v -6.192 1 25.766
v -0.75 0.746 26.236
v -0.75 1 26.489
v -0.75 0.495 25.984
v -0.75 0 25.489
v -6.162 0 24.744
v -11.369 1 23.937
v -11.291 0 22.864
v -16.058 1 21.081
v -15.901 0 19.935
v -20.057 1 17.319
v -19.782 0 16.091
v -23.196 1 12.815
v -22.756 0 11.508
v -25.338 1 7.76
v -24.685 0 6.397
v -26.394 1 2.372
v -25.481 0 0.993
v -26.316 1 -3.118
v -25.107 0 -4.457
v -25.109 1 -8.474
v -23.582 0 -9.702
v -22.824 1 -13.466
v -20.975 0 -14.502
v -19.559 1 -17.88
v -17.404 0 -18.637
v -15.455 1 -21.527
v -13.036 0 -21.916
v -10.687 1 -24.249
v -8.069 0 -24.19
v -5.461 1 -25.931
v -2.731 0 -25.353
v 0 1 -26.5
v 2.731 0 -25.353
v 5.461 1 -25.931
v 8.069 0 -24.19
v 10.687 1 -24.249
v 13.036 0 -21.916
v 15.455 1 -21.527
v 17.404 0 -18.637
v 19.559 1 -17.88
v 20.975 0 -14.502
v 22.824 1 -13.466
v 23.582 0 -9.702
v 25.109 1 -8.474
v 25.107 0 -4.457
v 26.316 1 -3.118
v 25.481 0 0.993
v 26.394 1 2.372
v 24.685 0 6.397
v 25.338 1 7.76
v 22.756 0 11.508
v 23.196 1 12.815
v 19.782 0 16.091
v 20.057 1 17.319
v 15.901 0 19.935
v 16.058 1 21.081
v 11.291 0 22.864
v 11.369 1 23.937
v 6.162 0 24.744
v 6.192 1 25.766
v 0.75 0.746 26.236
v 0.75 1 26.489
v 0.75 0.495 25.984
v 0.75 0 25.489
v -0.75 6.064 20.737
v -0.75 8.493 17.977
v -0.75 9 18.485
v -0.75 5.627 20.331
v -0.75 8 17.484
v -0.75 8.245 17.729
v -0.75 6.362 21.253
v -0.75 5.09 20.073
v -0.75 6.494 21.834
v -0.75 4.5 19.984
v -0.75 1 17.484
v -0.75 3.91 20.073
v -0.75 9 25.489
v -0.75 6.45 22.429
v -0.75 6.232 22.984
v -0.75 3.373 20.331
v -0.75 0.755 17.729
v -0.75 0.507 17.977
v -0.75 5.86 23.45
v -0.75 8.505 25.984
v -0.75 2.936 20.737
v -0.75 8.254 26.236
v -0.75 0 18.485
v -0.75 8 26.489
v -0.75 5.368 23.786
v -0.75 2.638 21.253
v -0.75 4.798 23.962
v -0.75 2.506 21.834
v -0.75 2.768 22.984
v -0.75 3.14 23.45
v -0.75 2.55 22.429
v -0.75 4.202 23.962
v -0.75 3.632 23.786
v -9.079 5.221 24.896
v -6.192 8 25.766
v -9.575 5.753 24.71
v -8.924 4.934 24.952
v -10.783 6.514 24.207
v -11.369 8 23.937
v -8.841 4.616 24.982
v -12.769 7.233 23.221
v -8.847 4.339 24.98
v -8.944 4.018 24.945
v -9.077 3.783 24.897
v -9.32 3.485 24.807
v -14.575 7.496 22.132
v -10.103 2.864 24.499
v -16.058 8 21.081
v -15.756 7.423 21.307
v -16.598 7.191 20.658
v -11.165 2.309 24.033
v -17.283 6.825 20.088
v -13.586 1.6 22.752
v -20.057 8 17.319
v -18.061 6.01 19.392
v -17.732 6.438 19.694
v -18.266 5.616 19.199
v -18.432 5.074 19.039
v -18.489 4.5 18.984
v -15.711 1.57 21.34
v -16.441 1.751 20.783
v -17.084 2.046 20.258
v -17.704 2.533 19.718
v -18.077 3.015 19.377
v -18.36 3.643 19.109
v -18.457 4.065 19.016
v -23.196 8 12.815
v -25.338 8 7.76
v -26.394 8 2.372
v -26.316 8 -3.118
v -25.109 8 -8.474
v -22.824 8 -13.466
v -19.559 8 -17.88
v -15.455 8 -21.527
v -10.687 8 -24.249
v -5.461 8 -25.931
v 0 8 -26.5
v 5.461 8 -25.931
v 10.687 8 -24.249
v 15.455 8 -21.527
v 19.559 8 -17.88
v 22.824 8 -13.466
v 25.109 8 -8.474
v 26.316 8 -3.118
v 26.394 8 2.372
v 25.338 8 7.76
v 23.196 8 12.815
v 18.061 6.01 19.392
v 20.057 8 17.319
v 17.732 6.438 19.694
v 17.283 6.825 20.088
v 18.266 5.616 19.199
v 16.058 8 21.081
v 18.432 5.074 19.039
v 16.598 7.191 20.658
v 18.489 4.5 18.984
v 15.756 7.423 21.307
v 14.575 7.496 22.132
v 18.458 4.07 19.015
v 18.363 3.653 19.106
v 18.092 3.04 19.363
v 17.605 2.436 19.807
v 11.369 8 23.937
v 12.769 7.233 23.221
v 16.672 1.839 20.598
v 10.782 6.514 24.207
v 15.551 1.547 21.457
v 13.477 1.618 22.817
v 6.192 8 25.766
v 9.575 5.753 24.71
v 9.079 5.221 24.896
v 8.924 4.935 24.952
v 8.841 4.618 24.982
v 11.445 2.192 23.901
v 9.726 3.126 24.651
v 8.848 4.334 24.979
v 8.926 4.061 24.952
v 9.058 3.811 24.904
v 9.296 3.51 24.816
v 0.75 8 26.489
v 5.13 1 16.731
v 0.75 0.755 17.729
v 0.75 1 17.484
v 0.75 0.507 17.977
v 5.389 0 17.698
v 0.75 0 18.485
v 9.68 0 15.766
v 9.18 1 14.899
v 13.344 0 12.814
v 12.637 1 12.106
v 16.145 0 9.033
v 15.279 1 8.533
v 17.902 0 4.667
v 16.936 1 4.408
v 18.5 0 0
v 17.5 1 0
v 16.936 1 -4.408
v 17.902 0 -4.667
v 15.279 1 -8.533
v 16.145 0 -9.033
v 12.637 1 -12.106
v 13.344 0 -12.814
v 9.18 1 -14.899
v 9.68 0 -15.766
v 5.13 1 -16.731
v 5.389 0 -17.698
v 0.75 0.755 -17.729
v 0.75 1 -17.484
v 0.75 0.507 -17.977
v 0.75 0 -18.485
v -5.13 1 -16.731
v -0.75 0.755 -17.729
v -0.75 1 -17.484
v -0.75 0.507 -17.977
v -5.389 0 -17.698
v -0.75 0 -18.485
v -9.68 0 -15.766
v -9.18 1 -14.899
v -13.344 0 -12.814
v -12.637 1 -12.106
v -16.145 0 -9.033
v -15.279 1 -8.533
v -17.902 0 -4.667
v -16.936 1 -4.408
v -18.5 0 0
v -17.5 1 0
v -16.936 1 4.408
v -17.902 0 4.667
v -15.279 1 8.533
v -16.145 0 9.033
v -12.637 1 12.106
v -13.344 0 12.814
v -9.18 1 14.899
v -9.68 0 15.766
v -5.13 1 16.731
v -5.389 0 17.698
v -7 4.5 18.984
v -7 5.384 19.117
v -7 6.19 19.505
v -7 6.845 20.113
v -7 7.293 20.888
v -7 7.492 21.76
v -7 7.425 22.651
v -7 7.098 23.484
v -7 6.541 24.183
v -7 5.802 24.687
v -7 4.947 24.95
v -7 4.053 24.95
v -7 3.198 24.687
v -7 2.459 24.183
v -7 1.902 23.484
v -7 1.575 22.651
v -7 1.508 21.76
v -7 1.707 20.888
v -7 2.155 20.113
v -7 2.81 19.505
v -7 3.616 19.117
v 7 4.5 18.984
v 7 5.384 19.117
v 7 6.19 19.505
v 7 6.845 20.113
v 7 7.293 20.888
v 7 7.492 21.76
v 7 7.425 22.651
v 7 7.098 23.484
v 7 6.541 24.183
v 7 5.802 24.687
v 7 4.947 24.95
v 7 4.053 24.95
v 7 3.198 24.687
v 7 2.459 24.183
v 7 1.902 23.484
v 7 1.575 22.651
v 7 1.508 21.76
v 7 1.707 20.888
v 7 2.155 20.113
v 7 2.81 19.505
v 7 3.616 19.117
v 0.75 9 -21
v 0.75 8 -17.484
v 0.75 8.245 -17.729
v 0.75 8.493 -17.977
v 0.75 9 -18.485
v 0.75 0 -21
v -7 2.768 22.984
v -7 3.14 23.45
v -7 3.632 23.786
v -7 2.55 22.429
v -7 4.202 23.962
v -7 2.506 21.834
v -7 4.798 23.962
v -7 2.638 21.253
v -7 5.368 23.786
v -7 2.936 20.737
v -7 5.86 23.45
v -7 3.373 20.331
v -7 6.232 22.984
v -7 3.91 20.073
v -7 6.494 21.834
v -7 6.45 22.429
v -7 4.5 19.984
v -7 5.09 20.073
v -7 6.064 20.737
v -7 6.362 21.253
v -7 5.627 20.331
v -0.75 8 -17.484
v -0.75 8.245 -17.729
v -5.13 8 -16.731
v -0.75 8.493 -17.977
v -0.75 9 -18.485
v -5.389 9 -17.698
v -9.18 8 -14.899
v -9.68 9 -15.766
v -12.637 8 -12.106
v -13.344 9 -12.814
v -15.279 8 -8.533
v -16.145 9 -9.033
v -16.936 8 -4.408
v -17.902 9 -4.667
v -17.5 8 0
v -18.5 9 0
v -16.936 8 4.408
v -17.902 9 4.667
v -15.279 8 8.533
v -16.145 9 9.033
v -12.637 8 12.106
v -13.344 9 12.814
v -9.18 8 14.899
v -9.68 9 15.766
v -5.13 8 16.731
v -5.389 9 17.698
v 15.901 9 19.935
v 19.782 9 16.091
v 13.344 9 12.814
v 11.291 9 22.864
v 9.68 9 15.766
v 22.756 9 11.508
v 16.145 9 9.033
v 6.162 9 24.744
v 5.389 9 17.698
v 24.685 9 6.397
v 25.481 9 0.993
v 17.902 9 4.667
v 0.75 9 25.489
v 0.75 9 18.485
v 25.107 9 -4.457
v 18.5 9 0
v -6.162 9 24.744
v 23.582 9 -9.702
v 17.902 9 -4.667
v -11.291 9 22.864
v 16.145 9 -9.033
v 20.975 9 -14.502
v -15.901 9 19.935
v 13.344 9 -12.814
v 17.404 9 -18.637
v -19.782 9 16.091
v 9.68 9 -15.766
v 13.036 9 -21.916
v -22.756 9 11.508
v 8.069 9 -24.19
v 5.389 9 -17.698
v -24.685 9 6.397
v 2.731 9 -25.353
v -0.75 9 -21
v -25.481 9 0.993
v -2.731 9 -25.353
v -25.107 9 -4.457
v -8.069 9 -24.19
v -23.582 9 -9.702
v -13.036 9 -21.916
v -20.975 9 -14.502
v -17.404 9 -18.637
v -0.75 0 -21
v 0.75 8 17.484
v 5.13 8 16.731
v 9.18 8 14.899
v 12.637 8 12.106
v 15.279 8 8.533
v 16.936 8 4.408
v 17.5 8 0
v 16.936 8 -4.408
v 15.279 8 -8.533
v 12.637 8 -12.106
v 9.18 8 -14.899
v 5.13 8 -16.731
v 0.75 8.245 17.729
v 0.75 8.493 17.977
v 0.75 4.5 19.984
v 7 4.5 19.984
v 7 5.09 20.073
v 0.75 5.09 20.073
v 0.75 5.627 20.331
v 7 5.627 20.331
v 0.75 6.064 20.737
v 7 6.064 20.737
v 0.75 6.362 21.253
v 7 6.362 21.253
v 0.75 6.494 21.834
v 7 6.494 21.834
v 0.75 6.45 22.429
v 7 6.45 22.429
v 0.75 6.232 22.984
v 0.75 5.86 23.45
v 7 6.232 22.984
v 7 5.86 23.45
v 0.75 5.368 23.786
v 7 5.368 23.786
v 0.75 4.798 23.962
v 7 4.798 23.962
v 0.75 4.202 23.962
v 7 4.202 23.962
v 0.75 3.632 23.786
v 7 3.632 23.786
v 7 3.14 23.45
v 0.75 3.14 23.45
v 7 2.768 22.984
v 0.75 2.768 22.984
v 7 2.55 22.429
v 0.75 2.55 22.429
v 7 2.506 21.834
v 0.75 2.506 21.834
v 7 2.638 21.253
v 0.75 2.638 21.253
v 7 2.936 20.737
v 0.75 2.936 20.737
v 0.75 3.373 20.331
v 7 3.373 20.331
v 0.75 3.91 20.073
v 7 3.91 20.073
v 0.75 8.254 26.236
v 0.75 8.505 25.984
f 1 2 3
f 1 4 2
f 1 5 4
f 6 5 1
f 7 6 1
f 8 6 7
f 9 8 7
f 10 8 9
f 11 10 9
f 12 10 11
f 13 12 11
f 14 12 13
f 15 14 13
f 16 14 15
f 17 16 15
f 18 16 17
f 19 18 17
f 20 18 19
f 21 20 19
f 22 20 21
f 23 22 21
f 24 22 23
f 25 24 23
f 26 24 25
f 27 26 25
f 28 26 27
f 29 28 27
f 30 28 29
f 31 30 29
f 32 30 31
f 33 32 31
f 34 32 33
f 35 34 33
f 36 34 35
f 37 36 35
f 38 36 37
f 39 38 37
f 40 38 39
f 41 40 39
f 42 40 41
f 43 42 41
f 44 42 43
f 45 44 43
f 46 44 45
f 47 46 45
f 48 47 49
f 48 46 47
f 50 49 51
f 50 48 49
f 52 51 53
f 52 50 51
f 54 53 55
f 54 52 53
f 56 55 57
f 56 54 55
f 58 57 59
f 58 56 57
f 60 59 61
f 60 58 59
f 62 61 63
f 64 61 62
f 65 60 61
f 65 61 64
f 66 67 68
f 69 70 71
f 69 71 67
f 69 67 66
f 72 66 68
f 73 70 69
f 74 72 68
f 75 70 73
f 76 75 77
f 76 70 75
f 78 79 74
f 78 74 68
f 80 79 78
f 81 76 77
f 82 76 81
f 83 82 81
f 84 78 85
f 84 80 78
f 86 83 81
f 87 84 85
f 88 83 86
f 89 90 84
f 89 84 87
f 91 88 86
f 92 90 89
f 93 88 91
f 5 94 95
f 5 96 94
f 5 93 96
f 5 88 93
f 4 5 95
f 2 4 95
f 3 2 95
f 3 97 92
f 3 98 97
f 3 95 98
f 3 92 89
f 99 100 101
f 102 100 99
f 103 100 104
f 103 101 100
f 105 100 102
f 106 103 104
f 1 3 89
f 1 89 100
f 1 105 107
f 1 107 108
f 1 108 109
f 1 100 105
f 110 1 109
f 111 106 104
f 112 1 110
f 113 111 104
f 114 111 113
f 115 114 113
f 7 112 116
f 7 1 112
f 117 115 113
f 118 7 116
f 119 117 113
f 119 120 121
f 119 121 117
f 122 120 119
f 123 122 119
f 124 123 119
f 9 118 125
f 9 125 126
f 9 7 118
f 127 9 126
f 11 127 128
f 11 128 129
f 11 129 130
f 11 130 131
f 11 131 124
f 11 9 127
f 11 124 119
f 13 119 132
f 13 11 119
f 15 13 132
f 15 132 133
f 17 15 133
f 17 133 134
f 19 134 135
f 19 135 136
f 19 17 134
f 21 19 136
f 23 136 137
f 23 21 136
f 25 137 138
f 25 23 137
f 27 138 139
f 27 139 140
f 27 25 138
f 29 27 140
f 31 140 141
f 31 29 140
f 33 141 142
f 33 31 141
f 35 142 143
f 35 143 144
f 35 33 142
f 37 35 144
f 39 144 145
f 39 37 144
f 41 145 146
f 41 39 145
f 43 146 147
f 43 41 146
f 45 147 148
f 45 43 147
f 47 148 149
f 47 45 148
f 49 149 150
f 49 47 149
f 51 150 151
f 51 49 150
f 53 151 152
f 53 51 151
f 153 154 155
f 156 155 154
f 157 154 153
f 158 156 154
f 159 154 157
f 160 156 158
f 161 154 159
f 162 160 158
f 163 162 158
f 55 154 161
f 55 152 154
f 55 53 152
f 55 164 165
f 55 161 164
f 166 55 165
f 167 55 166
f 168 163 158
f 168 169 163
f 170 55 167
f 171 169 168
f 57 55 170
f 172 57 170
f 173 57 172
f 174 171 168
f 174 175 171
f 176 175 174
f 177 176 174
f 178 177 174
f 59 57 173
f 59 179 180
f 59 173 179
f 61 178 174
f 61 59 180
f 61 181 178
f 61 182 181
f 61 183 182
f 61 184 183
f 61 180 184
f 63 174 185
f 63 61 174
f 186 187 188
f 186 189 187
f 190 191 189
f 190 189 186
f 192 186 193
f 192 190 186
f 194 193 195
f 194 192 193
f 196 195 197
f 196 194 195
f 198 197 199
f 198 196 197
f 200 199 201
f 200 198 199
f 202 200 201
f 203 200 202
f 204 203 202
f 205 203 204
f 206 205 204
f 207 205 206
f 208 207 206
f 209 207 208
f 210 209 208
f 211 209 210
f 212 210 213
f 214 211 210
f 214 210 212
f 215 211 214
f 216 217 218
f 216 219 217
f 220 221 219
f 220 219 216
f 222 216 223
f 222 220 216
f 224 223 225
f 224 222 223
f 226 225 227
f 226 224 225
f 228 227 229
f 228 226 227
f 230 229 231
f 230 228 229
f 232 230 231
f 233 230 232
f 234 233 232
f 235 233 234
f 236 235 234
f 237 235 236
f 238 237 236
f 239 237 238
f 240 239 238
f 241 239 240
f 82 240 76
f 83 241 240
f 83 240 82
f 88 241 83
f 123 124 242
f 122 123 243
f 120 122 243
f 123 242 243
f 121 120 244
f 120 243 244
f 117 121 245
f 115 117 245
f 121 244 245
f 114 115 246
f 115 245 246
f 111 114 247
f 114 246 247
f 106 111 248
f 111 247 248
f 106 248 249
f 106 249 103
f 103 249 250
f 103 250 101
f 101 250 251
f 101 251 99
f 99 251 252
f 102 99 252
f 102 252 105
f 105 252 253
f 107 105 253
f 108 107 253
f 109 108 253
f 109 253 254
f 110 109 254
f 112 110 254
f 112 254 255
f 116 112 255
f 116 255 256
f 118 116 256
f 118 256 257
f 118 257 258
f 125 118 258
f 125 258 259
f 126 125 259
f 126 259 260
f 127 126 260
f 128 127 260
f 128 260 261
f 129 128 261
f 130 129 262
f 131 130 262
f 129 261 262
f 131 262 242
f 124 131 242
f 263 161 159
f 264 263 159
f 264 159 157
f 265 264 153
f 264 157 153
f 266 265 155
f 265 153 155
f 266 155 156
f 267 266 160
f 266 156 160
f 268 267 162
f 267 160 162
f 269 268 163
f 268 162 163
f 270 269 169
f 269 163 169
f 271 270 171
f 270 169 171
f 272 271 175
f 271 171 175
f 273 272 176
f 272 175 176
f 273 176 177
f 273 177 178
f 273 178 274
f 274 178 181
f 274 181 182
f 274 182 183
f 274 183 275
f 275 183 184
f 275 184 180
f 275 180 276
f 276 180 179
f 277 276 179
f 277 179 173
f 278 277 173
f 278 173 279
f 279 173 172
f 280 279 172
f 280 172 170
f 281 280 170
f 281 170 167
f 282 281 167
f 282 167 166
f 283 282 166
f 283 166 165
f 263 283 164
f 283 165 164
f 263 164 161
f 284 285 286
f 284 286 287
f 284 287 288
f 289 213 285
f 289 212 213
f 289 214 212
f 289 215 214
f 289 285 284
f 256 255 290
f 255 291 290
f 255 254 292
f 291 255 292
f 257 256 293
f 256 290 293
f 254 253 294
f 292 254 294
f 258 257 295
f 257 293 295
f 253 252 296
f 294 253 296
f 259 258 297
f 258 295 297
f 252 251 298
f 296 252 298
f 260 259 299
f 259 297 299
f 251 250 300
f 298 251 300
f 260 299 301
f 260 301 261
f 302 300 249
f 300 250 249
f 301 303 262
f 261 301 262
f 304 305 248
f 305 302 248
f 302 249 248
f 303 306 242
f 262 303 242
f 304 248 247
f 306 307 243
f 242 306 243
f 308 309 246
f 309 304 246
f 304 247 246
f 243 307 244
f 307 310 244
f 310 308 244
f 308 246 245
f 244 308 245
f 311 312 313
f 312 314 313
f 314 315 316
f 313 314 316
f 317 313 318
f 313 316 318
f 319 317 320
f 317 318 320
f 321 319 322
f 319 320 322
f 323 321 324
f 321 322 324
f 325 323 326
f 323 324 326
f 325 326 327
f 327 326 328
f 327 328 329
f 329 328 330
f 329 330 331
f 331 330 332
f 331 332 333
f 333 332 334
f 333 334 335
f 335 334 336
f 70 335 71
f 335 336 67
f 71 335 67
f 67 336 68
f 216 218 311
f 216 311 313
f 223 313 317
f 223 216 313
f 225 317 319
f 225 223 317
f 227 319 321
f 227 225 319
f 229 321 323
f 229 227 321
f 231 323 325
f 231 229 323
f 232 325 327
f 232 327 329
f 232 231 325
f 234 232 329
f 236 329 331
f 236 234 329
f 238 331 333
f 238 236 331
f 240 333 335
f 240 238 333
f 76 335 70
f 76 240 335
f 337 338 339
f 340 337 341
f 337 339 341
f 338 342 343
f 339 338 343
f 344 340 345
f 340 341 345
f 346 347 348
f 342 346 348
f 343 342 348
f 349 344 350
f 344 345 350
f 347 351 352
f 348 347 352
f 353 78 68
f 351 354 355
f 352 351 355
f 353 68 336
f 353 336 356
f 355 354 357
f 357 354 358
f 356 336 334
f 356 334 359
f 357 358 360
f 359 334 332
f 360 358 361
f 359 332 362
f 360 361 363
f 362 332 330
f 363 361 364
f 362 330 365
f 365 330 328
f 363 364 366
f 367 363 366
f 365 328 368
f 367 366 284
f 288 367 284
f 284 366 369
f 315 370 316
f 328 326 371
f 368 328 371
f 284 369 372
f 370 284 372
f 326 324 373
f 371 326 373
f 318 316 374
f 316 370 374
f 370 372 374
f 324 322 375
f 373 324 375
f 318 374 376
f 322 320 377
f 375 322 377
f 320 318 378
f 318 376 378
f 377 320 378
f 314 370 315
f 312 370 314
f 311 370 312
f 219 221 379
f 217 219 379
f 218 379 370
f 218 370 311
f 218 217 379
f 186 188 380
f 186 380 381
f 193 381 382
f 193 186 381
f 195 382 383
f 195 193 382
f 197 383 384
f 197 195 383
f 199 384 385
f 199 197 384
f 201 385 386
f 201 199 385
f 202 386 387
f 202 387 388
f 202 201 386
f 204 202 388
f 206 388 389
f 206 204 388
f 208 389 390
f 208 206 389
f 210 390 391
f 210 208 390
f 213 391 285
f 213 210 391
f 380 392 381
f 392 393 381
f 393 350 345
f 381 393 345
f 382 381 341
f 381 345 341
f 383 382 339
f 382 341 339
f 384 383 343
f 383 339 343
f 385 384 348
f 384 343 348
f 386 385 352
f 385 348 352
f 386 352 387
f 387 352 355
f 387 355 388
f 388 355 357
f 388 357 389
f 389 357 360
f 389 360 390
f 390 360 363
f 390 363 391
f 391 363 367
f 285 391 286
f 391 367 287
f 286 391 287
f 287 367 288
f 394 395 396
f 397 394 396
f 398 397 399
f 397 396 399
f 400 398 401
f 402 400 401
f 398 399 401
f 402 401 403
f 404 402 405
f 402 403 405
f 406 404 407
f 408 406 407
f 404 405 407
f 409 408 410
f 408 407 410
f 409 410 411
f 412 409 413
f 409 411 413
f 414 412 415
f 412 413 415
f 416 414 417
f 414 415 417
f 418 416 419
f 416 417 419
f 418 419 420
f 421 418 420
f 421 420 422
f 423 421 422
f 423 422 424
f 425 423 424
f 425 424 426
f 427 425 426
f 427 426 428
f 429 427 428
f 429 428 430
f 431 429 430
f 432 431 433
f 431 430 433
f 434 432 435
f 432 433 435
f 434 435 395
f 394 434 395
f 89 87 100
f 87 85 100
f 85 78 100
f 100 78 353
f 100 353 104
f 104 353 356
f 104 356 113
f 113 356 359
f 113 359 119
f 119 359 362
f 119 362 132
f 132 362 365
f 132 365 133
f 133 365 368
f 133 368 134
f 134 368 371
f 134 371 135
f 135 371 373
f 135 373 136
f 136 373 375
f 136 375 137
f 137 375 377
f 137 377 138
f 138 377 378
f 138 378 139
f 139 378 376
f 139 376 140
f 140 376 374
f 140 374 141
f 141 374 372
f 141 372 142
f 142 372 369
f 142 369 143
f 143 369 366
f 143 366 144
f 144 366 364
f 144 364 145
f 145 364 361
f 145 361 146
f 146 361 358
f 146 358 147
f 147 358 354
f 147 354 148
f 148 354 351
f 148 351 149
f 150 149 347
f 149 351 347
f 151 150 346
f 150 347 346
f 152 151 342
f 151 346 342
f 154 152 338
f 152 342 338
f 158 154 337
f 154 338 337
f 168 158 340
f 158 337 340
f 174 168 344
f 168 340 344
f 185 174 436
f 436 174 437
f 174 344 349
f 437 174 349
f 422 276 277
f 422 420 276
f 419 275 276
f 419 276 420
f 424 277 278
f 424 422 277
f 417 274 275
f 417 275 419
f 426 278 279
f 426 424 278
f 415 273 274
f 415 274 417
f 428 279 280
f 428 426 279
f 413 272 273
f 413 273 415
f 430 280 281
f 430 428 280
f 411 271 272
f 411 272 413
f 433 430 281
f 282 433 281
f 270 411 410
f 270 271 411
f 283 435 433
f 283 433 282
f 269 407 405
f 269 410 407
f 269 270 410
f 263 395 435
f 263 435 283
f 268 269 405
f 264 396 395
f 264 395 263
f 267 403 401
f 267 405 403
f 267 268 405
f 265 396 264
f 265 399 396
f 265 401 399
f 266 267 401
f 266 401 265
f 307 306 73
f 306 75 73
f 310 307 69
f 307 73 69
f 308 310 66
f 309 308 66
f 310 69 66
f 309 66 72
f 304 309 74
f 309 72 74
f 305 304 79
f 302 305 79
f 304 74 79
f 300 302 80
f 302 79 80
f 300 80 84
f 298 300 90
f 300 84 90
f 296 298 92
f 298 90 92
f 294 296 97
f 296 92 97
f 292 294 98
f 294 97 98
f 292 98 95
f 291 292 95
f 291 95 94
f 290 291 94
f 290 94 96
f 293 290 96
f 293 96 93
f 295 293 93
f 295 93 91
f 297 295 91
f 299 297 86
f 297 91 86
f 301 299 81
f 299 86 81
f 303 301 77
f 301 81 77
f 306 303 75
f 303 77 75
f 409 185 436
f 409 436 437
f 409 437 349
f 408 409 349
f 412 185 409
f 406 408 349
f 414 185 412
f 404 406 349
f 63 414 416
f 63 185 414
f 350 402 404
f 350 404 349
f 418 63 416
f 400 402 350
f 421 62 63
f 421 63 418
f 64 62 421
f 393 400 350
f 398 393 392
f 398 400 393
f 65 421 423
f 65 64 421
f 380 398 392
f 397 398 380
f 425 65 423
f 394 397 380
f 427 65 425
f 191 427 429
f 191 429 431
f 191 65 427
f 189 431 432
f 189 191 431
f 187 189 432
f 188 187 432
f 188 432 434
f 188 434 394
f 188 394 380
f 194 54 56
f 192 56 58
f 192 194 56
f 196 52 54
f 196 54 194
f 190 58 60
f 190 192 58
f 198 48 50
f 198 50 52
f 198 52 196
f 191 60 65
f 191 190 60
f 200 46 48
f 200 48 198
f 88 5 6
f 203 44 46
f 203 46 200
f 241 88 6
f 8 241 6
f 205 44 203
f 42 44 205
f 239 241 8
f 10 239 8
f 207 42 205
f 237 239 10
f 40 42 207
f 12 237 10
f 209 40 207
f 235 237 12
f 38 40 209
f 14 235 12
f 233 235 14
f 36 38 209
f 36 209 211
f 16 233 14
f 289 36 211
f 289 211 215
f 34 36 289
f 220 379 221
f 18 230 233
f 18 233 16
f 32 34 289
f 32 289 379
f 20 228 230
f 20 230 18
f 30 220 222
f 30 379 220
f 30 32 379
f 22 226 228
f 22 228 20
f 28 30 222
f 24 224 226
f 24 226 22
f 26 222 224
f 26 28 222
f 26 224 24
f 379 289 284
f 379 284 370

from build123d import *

# Parameters (mm, degrees)
BOSS_EXTRUDE1_DEPTH = 9
CHAMFER1_SIZE       = 1
SKETCH2_R           = 2
CUT_EXTRUDE1_DEPTH  = 25
CUT_EXTRUDE2_START  = -7
SKETCH2_3_R         = 3
SKETCH2_3_R_2       = 2
CUT_EXTRUDE2_DEPTH  = 15
CUT_EXTRUDE3_START  = 24
SKETCH2_4_R         = 3
SKETCH2_4_R_2       = 2
CUT_EXTRUDE3_DEPTH  = 17


with BuildPart() as part:
    # Sketch1 → Boss-Extrude1 (new body)
    with BuildSketch(Plane(origin=(0, 0, 0), x_dir=(1, 0, 0), z_dir=(0, 1, 0))):
        with BuildLine():
            Line((-0.75, 21), (-0.75, 17.483921185))
            ThreePointArc((-0.75, 17.483921185), (-17.5, 0), (-0.75, -17.483921185))
            Line((-0.75, -17.483921185), (-0.75, -26.489384666))
            ThreePointArc((-0.75, -26.489384666), (0, 26.5), (0.75, -26.489384666))
            Line((0.75, -26.489384666), (0.75, -17.483921185))
            ThreePointArc((0.75, -17.483921185), (17.5, 0), (0.75, 17.483921185))
            Line((0.75, 17.483921185), (0.75, 21))
            Line((0.75, 21), (-0.75, 21))
        make_face()
    extrude(amount=BOSS_EXTRUDE1_DEPTH)

    # Chamfer1
    chamfer1_edges = [part.edges().sort_by_distance(p)[0] for p in [
        (17.5, 0, 0),
        (17.5, 9, 0),
        (0, 9, -26.5),
        (-17.5, 9, 0),
        (-17.5, 0, 0),
        (0, 0, -26.5),
    ]]
    chamfer(chamfer1_edges, length=CHAMFER1_SIZE)

    # Sketch2 → Cut-Extrude1 (cut, symmetric)
    with BuildSketch(Plane(origin=(0, 0, 0), x_dir=(0, 0, -1), z_dir=(1, 0, 0))):
        with Locations((-21.983921185, 4.5)):
            Circle(SKETCH2_R)
    extrude(amount=CUT_EXTRUDE1_DEPTH, both=True, mode=Mode.SUBTRACT)

    # Sketch2<3> → Cut-Extrude2 (cut)
    with BuildSketch(Plane(origin=(0, 0, 0), x_dir=(0, 0, -1), z_dir=(1, 0, 0)).offset(CUT_EXTRUDE2_START)):
        with Locations((-21.983921185, 4.5)):
            Circle(SKETCH2_3_R)
        with Locations((-21.983921185, 4.5)):
            Circle(SKETCH2_3_R_2, mode=Mode.SUBTRACT)
    extrude(amount=-CUT_EXTRUDE2_DEPTH, mode=Mode.SUBTRACT)

    # Sketch2<4> → Cut-Extrude3 (cut)
    with BuildSketch(Plane(origin=(0, 0, 0), x_dir=(0, 0, -1), z_dir=(1, 0, 0)).offset(CUT_EXTRUDE3_START)):
        with Locations((-21.983921185, 4.5)):
            Circle(SKETCH2_4_R)
        with Locations((-21.983921185, 4.5)):
            Circle(SKETCH2_4_R_2, mode=Mode.SUBTRACT)
    extrude(amount=-CUT_EXTRUDE3_DEPTH, mode=Mode.SUBTRACT)


solid = part.part
